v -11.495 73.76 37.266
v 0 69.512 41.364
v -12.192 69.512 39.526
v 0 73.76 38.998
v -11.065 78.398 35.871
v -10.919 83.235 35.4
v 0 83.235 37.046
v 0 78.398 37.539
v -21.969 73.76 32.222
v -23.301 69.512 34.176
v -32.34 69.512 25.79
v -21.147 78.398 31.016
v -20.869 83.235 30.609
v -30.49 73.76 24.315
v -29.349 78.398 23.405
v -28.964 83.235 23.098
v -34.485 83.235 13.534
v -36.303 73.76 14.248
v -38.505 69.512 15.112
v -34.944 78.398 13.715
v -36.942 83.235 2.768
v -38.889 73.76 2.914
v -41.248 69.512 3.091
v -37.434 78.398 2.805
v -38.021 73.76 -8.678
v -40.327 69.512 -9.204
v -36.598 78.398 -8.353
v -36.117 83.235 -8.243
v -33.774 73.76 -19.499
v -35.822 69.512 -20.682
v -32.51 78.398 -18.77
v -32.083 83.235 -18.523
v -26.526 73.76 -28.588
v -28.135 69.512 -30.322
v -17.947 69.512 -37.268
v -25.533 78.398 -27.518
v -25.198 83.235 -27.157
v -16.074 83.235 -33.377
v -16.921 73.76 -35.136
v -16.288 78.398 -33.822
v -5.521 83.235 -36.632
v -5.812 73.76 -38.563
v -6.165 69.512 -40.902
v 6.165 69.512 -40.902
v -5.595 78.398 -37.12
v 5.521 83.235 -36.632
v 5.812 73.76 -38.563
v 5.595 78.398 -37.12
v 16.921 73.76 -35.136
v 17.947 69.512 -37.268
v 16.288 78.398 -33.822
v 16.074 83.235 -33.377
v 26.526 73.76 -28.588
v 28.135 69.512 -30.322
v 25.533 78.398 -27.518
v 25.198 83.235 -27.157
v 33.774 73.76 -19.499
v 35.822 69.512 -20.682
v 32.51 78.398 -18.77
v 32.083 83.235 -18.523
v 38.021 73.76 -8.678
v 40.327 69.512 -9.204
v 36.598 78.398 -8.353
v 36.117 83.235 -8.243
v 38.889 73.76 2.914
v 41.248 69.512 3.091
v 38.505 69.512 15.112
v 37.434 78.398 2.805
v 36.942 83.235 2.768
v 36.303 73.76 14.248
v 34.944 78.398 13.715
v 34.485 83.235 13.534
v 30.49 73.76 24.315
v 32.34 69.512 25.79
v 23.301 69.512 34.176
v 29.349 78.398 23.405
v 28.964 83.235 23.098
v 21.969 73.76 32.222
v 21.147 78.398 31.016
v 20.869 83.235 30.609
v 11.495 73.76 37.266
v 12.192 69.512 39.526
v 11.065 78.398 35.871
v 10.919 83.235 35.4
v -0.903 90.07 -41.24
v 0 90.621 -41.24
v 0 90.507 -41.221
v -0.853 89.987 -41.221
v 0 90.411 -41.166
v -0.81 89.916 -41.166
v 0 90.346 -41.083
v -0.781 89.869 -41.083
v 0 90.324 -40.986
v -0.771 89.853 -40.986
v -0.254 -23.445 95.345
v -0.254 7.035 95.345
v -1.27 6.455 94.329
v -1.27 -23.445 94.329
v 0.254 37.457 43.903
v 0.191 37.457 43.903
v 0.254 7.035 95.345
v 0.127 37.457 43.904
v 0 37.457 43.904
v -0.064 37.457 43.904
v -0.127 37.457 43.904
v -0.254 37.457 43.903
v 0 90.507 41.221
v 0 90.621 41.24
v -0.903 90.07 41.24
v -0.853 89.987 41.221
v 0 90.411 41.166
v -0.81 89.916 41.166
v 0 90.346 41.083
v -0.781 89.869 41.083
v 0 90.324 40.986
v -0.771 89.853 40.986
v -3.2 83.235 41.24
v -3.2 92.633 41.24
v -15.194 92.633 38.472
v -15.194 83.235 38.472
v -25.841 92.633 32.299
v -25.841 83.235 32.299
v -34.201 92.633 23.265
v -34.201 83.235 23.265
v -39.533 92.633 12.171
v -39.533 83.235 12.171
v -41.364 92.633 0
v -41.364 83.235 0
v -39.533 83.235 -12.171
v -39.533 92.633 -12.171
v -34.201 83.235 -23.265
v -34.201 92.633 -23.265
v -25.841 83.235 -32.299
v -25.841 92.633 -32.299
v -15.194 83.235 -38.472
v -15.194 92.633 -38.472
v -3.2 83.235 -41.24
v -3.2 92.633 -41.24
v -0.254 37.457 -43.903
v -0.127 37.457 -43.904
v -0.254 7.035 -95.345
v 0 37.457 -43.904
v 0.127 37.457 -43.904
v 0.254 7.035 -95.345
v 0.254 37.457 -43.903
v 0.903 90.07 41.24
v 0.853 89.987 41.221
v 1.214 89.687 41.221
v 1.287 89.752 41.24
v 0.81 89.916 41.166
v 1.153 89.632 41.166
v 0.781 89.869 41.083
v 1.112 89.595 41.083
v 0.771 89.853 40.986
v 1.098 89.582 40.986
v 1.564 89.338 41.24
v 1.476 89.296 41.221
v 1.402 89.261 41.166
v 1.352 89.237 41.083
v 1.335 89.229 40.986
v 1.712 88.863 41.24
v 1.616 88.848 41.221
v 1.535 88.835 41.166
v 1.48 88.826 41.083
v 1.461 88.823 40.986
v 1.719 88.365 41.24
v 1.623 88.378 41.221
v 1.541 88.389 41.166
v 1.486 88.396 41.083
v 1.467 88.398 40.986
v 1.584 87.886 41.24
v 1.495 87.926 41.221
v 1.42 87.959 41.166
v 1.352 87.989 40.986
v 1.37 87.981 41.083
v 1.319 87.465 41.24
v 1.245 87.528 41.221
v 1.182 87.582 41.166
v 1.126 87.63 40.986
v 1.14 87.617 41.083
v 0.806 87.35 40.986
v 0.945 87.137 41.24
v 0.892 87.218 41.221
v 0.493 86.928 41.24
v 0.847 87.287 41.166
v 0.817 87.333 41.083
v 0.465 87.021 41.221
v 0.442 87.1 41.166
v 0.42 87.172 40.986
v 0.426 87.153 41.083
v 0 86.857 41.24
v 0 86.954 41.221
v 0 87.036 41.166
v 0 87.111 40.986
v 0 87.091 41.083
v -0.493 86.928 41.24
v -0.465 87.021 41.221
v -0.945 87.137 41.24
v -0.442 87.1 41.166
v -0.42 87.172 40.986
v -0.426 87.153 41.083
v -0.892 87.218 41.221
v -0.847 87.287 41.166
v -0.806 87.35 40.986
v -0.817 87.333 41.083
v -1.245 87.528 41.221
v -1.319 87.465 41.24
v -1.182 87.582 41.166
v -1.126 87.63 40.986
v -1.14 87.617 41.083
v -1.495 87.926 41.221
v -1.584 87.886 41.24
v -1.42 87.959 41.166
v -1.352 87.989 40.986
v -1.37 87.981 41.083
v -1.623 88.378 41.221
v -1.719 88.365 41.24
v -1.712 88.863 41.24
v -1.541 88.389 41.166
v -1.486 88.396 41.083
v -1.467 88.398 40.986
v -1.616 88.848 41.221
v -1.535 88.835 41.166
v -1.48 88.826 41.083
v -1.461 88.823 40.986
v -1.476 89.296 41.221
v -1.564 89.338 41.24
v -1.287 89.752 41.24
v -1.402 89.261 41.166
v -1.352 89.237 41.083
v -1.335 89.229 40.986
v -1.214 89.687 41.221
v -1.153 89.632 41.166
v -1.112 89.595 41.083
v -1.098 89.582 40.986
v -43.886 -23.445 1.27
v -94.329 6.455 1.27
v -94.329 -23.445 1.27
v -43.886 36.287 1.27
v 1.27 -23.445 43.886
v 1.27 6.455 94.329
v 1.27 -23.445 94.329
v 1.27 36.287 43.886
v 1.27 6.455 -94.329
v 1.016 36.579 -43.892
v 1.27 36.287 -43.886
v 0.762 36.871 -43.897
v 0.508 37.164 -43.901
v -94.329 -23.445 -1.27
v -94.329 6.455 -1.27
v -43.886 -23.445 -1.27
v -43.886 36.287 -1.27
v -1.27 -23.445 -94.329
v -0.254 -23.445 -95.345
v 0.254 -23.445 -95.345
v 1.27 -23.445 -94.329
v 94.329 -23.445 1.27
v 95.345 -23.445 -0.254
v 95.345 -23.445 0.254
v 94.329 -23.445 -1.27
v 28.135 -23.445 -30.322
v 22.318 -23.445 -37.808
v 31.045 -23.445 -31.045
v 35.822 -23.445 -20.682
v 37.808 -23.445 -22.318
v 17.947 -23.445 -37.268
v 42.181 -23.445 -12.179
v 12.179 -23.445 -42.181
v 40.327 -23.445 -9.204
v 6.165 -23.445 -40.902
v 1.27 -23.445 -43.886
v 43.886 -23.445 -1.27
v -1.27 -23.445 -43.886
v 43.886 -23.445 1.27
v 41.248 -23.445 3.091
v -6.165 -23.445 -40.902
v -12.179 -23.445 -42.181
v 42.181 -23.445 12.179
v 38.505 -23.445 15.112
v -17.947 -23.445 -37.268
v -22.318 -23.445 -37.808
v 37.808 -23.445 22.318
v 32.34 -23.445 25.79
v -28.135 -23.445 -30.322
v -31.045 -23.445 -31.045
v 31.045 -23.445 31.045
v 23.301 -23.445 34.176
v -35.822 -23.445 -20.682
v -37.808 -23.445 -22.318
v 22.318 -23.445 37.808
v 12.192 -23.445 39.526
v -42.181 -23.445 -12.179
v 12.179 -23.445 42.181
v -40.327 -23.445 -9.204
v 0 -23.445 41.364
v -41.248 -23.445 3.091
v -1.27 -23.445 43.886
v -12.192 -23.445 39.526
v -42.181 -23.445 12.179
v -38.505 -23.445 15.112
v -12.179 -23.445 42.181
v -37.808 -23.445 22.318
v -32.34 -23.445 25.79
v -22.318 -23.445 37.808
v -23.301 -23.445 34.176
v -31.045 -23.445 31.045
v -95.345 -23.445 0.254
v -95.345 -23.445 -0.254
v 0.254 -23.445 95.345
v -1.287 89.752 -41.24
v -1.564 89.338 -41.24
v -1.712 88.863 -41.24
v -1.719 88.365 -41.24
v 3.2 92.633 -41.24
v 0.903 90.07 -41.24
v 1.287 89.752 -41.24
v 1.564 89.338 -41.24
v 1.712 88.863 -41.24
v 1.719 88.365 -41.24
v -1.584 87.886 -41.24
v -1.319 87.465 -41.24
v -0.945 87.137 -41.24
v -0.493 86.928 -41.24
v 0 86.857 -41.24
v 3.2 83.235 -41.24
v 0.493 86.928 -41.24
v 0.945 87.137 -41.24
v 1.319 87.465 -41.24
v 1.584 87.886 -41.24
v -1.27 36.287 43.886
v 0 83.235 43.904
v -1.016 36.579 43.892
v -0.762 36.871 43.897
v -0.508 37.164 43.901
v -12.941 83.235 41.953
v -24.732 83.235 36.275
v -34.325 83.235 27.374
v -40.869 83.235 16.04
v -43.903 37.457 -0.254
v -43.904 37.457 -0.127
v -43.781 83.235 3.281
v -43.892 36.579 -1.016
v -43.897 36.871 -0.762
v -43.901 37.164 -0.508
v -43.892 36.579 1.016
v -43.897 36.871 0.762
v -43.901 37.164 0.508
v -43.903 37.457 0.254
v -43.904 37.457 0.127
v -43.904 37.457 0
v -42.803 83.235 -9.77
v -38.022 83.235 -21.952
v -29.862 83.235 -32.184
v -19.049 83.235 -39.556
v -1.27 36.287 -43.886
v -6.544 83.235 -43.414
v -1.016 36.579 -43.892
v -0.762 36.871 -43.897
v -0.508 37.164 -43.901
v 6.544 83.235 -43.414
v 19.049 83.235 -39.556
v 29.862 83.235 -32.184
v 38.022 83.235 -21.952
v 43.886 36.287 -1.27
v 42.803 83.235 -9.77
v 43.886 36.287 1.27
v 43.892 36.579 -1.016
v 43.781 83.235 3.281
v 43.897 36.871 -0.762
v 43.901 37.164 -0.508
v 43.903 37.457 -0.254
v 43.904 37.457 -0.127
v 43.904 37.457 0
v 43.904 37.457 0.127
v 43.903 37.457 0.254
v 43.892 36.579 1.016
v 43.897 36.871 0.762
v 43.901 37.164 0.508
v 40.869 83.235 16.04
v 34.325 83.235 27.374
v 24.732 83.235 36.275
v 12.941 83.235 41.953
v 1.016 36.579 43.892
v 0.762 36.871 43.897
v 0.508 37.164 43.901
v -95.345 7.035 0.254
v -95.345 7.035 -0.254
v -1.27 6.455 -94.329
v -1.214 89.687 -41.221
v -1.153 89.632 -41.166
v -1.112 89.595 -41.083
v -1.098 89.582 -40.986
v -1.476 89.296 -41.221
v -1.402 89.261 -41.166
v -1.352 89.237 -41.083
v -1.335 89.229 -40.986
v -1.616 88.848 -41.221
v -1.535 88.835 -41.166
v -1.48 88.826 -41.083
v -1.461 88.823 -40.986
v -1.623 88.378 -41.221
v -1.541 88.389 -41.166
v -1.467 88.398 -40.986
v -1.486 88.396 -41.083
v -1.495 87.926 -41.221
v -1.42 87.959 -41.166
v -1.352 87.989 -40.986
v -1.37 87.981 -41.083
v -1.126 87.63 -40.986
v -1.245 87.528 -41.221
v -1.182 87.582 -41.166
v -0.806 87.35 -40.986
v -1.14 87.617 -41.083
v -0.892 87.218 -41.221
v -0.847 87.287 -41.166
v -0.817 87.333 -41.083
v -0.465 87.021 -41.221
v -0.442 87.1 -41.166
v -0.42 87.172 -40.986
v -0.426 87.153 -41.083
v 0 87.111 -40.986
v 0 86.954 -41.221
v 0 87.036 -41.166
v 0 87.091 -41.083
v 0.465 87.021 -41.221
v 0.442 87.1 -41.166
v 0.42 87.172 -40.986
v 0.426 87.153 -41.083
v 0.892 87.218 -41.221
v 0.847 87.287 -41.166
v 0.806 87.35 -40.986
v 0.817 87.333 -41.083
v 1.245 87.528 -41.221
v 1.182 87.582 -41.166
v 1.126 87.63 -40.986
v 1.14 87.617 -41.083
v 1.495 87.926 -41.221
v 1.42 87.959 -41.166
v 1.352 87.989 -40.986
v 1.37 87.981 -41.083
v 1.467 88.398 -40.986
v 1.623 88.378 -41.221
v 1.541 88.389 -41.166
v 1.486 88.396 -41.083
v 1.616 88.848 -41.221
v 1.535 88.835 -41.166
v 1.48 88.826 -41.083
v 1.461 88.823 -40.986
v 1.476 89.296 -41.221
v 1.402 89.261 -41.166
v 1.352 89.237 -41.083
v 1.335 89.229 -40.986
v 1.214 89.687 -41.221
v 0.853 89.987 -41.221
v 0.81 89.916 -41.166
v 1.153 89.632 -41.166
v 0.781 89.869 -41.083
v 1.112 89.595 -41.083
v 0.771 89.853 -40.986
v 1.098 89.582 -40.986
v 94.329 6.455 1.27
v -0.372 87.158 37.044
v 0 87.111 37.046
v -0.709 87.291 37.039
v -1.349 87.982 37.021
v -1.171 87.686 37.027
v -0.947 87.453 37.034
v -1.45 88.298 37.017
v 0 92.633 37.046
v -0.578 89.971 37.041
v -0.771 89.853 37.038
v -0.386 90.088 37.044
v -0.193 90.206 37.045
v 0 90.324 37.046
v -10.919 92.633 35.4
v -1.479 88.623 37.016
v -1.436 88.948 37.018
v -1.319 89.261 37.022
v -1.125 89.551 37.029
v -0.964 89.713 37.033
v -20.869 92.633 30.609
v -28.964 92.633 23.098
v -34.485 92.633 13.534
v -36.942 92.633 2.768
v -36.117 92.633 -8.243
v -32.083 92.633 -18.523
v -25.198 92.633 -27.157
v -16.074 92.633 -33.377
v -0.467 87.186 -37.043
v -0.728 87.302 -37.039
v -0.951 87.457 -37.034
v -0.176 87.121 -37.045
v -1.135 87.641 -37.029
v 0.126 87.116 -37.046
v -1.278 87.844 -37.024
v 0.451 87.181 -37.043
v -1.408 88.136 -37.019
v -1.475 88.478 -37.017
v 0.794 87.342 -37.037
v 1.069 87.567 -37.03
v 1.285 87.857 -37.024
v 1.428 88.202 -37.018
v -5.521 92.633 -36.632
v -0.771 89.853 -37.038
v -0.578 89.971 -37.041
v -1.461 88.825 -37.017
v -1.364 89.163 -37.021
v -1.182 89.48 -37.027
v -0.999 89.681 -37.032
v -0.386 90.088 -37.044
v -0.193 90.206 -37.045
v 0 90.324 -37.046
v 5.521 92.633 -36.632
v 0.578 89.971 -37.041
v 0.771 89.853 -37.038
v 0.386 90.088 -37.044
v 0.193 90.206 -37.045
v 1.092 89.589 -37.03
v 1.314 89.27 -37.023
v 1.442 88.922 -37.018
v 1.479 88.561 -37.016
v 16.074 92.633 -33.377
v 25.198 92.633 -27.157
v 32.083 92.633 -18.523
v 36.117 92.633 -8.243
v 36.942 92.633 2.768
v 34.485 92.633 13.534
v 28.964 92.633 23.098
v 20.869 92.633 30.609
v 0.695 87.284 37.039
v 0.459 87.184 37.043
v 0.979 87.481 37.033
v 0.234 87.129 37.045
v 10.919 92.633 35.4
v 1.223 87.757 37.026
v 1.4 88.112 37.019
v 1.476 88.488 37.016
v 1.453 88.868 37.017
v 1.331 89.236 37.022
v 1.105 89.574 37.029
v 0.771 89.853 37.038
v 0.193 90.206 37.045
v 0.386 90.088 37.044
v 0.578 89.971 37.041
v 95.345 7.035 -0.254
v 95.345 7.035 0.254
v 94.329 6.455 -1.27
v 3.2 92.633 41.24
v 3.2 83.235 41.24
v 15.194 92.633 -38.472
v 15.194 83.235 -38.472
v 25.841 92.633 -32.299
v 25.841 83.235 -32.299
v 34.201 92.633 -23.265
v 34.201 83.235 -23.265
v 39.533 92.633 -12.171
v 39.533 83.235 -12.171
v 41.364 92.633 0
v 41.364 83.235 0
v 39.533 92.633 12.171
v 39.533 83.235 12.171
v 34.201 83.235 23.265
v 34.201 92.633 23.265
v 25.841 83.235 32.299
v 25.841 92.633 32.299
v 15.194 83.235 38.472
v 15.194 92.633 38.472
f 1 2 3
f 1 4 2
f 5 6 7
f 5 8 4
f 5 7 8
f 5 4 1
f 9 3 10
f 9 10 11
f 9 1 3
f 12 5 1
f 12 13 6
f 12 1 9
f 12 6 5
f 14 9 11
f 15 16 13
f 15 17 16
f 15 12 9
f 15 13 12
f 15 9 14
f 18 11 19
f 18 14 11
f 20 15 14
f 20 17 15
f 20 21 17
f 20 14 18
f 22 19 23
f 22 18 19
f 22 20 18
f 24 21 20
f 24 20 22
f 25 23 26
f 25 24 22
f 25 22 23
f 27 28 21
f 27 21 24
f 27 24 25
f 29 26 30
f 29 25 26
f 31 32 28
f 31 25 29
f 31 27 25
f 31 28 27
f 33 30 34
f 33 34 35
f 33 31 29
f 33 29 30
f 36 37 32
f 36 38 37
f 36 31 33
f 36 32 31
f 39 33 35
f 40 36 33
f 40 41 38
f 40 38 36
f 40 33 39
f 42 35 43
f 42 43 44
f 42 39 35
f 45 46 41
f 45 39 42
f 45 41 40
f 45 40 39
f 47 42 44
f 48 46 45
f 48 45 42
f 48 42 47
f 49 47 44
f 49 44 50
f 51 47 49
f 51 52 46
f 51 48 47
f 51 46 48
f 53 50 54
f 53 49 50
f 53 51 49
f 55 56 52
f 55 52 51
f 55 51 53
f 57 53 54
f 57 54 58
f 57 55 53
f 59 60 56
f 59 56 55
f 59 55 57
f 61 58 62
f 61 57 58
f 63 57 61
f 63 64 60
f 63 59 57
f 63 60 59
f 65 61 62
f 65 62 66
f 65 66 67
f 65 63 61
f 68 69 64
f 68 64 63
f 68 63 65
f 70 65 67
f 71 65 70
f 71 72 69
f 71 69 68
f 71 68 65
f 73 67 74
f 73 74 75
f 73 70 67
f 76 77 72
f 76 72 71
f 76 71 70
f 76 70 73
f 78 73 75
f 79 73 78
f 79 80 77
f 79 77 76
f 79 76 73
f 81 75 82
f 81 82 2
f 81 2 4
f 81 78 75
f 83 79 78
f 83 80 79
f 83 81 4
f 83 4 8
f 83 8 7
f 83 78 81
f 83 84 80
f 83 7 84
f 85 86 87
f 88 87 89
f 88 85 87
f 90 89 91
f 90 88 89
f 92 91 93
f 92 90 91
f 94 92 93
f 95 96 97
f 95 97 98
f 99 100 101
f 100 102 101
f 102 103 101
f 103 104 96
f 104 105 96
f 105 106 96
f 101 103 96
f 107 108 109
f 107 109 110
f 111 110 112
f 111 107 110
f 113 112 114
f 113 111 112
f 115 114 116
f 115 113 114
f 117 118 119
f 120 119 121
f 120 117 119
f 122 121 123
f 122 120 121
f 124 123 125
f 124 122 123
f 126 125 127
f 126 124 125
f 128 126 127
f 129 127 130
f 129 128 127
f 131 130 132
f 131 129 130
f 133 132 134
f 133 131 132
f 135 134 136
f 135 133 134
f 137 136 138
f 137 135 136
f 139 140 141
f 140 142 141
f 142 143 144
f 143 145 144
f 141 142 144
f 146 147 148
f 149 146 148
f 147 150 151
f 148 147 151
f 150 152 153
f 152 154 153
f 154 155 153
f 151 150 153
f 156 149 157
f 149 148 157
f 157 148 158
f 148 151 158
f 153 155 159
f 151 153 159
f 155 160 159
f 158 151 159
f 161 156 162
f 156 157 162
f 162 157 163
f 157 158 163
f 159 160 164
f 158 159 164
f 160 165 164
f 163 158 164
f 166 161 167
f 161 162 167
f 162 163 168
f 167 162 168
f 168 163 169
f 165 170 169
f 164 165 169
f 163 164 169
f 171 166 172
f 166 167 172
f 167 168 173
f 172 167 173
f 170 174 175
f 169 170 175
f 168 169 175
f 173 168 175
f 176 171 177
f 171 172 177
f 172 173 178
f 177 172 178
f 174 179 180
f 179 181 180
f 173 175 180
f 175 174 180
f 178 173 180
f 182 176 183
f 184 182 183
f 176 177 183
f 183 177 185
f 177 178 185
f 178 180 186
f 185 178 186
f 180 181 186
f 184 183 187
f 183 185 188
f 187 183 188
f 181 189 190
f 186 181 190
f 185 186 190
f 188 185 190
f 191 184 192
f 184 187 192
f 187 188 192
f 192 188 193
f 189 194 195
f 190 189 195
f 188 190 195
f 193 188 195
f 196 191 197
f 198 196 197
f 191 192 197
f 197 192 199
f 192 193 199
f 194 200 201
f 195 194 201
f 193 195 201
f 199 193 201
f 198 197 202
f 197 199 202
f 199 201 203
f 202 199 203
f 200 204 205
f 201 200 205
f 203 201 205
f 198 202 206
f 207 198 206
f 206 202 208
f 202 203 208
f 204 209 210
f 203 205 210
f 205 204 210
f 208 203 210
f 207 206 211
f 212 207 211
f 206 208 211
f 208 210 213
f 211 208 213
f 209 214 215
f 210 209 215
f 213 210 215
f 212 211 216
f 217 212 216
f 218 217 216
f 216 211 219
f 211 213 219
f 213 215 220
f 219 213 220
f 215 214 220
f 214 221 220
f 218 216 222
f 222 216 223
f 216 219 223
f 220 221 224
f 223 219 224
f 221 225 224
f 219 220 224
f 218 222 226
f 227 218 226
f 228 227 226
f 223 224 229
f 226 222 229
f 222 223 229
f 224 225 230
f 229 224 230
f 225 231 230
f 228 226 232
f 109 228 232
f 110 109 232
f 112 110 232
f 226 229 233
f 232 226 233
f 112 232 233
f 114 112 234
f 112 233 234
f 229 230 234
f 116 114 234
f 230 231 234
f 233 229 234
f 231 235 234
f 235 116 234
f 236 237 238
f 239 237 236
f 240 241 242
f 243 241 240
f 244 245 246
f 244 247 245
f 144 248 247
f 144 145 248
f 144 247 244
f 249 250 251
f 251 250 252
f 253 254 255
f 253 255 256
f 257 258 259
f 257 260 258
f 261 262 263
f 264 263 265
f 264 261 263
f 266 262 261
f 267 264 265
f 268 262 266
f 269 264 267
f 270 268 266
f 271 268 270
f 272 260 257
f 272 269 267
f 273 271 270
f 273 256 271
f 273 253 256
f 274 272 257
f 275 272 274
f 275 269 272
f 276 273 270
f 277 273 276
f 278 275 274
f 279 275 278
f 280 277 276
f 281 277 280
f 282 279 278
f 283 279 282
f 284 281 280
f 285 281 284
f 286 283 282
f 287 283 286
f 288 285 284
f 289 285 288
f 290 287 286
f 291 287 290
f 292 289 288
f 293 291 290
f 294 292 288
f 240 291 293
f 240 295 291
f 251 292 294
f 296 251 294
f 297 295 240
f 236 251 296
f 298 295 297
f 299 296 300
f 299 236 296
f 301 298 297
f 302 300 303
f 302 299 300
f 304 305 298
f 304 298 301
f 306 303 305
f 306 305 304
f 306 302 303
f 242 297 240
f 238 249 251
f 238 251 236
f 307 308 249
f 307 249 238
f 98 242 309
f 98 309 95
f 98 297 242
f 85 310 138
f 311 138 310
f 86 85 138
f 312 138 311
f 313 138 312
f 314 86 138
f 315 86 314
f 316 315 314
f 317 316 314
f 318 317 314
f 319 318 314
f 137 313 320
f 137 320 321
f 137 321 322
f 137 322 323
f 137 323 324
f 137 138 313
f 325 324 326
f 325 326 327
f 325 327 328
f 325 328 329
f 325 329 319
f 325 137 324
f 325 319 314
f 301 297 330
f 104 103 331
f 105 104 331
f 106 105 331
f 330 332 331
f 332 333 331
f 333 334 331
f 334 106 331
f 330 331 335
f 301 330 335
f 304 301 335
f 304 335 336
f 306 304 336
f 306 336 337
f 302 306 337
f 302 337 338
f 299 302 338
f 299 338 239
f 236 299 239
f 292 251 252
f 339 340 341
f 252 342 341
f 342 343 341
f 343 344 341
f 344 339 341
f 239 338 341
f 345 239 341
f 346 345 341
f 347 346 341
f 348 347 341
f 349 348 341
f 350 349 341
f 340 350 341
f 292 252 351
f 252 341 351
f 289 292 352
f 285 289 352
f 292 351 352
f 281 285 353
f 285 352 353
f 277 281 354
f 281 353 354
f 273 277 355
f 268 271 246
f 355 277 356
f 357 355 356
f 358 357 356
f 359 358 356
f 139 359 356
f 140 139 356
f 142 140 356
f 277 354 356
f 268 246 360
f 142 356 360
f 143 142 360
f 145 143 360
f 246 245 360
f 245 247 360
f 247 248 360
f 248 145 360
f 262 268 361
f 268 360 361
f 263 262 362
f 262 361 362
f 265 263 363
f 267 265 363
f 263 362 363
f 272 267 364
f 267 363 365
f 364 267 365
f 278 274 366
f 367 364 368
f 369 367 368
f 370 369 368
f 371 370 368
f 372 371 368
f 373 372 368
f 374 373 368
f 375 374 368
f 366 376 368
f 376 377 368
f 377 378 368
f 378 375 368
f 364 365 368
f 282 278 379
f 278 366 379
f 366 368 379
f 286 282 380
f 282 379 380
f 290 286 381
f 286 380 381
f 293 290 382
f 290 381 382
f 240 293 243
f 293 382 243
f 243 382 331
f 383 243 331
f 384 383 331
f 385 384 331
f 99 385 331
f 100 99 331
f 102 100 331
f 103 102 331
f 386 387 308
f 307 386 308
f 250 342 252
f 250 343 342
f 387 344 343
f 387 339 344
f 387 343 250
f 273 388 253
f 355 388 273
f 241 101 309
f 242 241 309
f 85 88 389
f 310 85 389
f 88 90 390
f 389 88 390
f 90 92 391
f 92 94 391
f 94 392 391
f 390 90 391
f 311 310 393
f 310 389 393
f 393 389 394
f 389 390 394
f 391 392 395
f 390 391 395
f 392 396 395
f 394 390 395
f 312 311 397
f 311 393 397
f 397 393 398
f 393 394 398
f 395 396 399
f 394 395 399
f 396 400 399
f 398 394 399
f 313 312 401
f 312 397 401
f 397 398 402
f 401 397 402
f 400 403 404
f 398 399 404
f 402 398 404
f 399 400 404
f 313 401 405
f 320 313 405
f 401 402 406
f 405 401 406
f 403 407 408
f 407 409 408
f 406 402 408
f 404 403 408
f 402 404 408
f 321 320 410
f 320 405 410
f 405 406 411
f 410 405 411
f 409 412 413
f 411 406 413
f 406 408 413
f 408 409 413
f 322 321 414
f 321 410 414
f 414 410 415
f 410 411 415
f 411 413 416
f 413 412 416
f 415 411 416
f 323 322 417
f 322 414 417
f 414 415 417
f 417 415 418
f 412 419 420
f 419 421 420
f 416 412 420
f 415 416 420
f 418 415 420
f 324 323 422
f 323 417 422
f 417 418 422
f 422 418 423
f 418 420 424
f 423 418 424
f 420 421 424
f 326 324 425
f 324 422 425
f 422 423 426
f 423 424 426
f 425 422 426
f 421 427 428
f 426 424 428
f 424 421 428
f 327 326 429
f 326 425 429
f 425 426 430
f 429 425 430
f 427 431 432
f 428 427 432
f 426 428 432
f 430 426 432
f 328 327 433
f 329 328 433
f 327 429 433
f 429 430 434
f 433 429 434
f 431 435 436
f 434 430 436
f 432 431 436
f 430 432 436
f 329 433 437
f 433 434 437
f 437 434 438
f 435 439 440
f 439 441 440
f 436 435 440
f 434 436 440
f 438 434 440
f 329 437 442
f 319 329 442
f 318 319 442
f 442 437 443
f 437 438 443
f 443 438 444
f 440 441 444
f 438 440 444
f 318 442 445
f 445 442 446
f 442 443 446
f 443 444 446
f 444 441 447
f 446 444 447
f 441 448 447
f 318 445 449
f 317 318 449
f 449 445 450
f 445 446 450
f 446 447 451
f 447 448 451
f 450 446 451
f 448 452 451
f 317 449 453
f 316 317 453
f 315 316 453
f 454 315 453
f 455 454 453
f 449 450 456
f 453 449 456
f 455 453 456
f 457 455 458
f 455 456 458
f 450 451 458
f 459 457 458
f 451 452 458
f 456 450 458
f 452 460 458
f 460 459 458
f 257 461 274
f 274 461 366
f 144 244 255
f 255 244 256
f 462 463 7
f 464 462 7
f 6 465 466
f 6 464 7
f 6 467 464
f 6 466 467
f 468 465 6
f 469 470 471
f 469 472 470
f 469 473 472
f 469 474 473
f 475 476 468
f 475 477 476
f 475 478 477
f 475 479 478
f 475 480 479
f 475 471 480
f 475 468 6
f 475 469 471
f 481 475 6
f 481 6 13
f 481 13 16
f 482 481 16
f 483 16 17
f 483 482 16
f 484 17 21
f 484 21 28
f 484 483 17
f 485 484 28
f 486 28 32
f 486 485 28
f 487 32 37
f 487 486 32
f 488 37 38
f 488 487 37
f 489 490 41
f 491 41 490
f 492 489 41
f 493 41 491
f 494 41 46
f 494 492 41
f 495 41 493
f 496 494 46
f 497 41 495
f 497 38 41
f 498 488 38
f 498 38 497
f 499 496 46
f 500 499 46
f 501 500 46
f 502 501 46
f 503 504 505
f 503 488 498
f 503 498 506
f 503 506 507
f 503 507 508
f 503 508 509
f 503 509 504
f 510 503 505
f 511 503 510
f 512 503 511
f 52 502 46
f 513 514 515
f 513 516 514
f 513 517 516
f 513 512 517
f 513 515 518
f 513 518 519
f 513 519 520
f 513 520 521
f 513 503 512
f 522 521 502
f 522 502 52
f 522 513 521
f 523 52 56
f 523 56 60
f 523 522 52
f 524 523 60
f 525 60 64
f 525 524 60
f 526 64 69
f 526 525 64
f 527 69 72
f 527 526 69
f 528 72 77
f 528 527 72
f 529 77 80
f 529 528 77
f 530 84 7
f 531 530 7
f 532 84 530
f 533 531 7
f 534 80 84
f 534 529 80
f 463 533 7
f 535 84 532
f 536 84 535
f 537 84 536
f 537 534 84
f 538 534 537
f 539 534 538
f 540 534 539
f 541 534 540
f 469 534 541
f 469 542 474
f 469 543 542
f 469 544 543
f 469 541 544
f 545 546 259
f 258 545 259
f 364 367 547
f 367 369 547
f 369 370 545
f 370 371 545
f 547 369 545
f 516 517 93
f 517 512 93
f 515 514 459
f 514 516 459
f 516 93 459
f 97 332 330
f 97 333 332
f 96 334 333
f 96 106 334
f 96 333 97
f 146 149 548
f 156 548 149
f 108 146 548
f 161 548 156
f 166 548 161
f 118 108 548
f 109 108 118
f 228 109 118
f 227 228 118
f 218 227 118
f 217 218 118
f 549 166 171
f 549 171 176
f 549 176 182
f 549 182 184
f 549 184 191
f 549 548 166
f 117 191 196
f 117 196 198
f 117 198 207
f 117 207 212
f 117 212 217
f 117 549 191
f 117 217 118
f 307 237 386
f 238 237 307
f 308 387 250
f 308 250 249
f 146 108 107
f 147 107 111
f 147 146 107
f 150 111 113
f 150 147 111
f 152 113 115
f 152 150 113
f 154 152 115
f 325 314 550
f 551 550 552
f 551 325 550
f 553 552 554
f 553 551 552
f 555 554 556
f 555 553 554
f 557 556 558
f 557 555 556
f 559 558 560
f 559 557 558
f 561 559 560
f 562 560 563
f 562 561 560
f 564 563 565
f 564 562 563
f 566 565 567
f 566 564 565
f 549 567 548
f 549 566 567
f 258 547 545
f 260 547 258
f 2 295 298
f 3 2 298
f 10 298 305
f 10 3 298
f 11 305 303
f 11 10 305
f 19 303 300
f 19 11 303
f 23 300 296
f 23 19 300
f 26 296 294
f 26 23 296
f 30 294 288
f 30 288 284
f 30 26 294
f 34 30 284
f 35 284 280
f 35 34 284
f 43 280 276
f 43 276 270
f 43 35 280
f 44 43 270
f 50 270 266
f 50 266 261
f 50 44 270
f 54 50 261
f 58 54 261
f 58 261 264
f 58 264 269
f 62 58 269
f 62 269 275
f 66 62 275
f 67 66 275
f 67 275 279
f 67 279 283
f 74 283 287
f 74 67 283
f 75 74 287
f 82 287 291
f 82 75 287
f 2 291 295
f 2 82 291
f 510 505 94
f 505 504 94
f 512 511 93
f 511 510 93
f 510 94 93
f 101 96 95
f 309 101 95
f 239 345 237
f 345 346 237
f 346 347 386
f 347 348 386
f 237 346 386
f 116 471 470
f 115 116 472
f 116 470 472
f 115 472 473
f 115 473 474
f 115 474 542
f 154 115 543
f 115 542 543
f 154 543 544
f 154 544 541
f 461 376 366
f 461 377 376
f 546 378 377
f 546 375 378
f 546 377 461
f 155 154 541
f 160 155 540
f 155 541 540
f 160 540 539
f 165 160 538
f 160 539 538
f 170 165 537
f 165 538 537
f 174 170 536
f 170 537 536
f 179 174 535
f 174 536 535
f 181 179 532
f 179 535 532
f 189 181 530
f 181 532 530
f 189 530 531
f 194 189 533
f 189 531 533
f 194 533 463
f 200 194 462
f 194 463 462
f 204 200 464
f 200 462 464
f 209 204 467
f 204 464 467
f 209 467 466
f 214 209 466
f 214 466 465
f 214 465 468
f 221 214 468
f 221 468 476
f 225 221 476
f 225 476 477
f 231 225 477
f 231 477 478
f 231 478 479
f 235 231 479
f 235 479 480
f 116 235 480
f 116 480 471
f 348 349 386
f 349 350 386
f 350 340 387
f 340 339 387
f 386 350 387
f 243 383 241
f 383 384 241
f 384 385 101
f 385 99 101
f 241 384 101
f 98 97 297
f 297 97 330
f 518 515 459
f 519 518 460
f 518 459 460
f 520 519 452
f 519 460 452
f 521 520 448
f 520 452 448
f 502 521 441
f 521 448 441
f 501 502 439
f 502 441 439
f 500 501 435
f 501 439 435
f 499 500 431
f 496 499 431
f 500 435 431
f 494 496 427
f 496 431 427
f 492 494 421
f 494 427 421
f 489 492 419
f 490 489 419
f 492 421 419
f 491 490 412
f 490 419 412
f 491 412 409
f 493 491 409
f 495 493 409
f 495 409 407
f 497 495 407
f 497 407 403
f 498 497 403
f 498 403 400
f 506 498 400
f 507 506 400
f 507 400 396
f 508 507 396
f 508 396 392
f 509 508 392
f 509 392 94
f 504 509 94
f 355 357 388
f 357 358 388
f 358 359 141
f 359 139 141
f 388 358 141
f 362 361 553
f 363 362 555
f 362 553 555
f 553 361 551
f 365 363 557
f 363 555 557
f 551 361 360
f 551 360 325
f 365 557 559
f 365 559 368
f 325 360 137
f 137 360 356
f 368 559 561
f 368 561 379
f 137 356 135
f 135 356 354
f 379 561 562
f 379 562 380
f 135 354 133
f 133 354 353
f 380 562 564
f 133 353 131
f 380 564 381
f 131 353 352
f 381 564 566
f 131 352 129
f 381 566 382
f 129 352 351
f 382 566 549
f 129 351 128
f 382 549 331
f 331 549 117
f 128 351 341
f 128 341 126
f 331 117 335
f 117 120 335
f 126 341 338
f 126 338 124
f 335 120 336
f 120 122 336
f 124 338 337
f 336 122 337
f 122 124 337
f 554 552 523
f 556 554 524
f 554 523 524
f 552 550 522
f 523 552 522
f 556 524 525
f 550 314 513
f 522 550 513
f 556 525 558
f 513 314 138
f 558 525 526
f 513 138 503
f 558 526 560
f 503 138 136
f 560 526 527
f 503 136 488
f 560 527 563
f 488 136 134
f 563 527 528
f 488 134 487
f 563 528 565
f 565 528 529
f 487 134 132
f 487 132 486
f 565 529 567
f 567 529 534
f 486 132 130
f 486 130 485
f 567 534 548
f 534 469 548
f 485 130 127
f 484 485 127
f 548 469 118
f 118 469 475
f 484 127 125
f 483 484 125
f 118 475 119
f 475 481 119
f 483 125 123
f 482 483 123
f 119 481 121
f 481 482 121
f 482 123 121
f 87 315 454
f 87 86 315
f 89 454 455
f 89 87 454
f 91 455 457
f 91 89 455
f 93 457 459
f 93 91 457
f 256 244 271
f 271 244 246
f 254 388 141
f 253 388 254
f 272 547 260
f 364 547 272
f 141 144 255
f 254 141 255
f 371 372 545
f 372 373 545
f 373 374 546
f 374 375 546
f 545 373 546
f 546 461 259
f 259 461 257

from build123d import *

# Parameters (mm, degrees)
SKETCH1_W                    = 4.318
SKETCH1_H                    = 9.398
SKETCH1_W_2                  = 2.54
SKETCH1_H_2                  = 106.68
BOSS_EXTRUDE3_DEPTH          = 1.27
CHAMFER1_SIZE                = 1.016
CIRPATTERN6_COUNT            = 4
CHAMFER1_OF_CIRPATTERN6_SIZE = 1.016
CUT_EXTRUDE6_DEPTH           = 164.591183691
CUT_EXTRUDE6_DEPTH_BACK      = 164.591183691
CUT_EXTRUDE7_START           = -9.398
CUT_EXTRUDE7_DEPTH           = 188.317430146
CIRPATTERN7_COUNT            = 2
FILLET1_R                    = 0.254


with BuildPart() as part:
    # Sketch1 → Revolve1 (revolve)
    with BuildSketch(Plane.XY, mode=Mode.PRIVATE) as revolve1_sk:
        with BuildLine():
            Line((-37.0459, 83.23489827), (-41.3639, 83.23489827))
            Line((-41.3639, 83.23489827), (-41.3639, 69.51194771))
            ThreePointArc((-41.3639, 69.51194771), (-38.150873616, 76.041767935), (-37.0459, 83.23489827))
        make_face()
        with Locations((-39.2049, 87.93389827)):
            Rectangle(SKETCH1_W, SKETCH1_H)
        with Locations((-42.6339, 29.89489827)):
            Rectangle(SKETCH1_W_2, SKETCH1_H_2)
    revolve(revolve1_sk.sketch.rotate(Axis((0, 21.7161892, 0), (0, -1, 0)), 270), axis=Axis((0, 21.7161892, 0), (0, -1, 0)))

    # Sketch4 → Boss-Extrude3 (add, symmetric)
    with BuildSketch(Plane(origin=(0, 0, 0), x_dir=(0, 0, -1), z_dir=(1, 0, 0))):
        Polygon((43.805829154, -23.44510173), (43.805829154, 37.51489827), (95.344694503, 7.03489827), (95.344694503, -23.44510173), align=None)
    boss_extrude3 = extrude(amount=BOSS_EXTRUDE3_DEPTH, both=True)

    # Chamfer1
    chamfer1_edges = [part.edges().sort_by_distance(p)[0] for p in [
        (-1.27, -8.20510173, -95.344694503),
        (1.27, -8.20510173, -95.344694503),
        (-1.27, 22.251331497, -69.615111065),
        (1.27, 22.251331497, -69.615111065),
    ]]
    chamfer(chamfer1_edges, length=CHAMFER1_SIZE)

    # CirPattern6: Boss-Extrude3 ×4 about axis
    cirpattern6_axis = Axis((0, 0, 0), (0, 1, 0))
    for i in range(1, CIRPATTERN6_COUNT):
        add(boss_extrude3.rotate(cirpattern6_axis, i * 360 / CIRPATTERN6_COUNT))

    # Chamfer1 of CirPattern6
    chamfer1_of_cirpattern6_edges = [part.edges().sort_by_distance(p)[0] for p in [
        (-95.344694503, -8.20510173, 1.27),
        (-95.344694503, -8.20510173, -1.27),
        (-69.615111065, 22.251331497, 1.27),
        (-69.615111065, 22.251331497, -1.27),
        (1.27, -8.20510173, 95.344694503),
        (-1.27, -8.20510173, 95.344694503),
        (1.27, 22.251331497, 69.615111065),
        (-1.27, 22.251331497, 69.615111065),
        (95.344694503, -8.20510173, -1.27),
        (95.344694503, -8.20510173, 1.27),
        (69.615111065, 22.251331497, -1.27),
        (69.615111065, 22.251331497, 1.27),
    ]]
    chamfer(chamfer1_of_cirpattern6_edges, length=CHAMFER1_OF_CIRPATTERN6_SIZE)

    # Sketch6 → Cut-Extrude6 (cut, two sides: drawn at the far end of the back side and taken through both)
    with BuildSketch(Plane.XY.offset(-CUT_EXTRUDE6_DEPTH_BACK)):
        with BuildLine():
            Line((-0.771031735, 89.852901434), (0, 90.323685317))
            Line((0, 90.323685317), (0.771031735, 89.852901434))
            ThreePointArc((0.771031735, 89.852901434), (0, 87.110585317), (-0.771031735, 89.852901434))
        make_face()
    extrude(amount=CUT_EXTRUDE6_DEPTH + CUT_EXTRUDE6_DEPTH_BACK, mode=Mode.SUBTRACT)

    # Sketch7 → Cut-Extrude7 (cut)
    with BuildSketch(Plane(origin=(0, 92.63289827, 0), x_dir=(1, 0, 0), z_dir=(0, 1, 0)).offset(CUT_EXTRUDE7_START)):
        with BuildLine():
            ThreePointArc((0, 41.3639), (-1.601400576, 41.332889318), (-3.2004, 41.239903771))
            Line((-3.2004, 41.239903771), (3.2004, 41.239903771))
            ThreePointArc((3.2004, 41.239903771), (1.601400576, 41.332889318), (0, 41.3639))
        make_face()
    cut_extrude7 = extrude(amount=CUT_EXTRUDE7_DEPTH, mode=Mode.SUBTRACT)

    # CirPattern7: Cut-Extrude7 ×2 about axis
    cirpattern7_axis = Axis((0, 21.7161892, 0), (0, 1, 0))
    for i in range(1, CIRPATTERN7_COUNT):
        add(cut_extrude7.rotate(cirpattern7_axis, i * 360 / CIRPATTERN7_COUNT), mode=Mode.SUBTRACT)

    # Fillet1
    fillet1_edges = [part.edges().sort_by_distance(p)[0] for p in [
        (0.385515867, 90.088293375, -41.239903771),
        (0, 87.110585317, -41.239903771),
        (-0.385515867, 90.088293375, -41.239903771),
        (0, 87.110585317, 41.239903771),
        (-0.385515867, 90.088293375, 41.239903771),
        (0.385515867, 90.088293375, 41.239903771),
    ]]
    fillet(fillet1_edges, radius=FILLET1_R)


solid = part.part
